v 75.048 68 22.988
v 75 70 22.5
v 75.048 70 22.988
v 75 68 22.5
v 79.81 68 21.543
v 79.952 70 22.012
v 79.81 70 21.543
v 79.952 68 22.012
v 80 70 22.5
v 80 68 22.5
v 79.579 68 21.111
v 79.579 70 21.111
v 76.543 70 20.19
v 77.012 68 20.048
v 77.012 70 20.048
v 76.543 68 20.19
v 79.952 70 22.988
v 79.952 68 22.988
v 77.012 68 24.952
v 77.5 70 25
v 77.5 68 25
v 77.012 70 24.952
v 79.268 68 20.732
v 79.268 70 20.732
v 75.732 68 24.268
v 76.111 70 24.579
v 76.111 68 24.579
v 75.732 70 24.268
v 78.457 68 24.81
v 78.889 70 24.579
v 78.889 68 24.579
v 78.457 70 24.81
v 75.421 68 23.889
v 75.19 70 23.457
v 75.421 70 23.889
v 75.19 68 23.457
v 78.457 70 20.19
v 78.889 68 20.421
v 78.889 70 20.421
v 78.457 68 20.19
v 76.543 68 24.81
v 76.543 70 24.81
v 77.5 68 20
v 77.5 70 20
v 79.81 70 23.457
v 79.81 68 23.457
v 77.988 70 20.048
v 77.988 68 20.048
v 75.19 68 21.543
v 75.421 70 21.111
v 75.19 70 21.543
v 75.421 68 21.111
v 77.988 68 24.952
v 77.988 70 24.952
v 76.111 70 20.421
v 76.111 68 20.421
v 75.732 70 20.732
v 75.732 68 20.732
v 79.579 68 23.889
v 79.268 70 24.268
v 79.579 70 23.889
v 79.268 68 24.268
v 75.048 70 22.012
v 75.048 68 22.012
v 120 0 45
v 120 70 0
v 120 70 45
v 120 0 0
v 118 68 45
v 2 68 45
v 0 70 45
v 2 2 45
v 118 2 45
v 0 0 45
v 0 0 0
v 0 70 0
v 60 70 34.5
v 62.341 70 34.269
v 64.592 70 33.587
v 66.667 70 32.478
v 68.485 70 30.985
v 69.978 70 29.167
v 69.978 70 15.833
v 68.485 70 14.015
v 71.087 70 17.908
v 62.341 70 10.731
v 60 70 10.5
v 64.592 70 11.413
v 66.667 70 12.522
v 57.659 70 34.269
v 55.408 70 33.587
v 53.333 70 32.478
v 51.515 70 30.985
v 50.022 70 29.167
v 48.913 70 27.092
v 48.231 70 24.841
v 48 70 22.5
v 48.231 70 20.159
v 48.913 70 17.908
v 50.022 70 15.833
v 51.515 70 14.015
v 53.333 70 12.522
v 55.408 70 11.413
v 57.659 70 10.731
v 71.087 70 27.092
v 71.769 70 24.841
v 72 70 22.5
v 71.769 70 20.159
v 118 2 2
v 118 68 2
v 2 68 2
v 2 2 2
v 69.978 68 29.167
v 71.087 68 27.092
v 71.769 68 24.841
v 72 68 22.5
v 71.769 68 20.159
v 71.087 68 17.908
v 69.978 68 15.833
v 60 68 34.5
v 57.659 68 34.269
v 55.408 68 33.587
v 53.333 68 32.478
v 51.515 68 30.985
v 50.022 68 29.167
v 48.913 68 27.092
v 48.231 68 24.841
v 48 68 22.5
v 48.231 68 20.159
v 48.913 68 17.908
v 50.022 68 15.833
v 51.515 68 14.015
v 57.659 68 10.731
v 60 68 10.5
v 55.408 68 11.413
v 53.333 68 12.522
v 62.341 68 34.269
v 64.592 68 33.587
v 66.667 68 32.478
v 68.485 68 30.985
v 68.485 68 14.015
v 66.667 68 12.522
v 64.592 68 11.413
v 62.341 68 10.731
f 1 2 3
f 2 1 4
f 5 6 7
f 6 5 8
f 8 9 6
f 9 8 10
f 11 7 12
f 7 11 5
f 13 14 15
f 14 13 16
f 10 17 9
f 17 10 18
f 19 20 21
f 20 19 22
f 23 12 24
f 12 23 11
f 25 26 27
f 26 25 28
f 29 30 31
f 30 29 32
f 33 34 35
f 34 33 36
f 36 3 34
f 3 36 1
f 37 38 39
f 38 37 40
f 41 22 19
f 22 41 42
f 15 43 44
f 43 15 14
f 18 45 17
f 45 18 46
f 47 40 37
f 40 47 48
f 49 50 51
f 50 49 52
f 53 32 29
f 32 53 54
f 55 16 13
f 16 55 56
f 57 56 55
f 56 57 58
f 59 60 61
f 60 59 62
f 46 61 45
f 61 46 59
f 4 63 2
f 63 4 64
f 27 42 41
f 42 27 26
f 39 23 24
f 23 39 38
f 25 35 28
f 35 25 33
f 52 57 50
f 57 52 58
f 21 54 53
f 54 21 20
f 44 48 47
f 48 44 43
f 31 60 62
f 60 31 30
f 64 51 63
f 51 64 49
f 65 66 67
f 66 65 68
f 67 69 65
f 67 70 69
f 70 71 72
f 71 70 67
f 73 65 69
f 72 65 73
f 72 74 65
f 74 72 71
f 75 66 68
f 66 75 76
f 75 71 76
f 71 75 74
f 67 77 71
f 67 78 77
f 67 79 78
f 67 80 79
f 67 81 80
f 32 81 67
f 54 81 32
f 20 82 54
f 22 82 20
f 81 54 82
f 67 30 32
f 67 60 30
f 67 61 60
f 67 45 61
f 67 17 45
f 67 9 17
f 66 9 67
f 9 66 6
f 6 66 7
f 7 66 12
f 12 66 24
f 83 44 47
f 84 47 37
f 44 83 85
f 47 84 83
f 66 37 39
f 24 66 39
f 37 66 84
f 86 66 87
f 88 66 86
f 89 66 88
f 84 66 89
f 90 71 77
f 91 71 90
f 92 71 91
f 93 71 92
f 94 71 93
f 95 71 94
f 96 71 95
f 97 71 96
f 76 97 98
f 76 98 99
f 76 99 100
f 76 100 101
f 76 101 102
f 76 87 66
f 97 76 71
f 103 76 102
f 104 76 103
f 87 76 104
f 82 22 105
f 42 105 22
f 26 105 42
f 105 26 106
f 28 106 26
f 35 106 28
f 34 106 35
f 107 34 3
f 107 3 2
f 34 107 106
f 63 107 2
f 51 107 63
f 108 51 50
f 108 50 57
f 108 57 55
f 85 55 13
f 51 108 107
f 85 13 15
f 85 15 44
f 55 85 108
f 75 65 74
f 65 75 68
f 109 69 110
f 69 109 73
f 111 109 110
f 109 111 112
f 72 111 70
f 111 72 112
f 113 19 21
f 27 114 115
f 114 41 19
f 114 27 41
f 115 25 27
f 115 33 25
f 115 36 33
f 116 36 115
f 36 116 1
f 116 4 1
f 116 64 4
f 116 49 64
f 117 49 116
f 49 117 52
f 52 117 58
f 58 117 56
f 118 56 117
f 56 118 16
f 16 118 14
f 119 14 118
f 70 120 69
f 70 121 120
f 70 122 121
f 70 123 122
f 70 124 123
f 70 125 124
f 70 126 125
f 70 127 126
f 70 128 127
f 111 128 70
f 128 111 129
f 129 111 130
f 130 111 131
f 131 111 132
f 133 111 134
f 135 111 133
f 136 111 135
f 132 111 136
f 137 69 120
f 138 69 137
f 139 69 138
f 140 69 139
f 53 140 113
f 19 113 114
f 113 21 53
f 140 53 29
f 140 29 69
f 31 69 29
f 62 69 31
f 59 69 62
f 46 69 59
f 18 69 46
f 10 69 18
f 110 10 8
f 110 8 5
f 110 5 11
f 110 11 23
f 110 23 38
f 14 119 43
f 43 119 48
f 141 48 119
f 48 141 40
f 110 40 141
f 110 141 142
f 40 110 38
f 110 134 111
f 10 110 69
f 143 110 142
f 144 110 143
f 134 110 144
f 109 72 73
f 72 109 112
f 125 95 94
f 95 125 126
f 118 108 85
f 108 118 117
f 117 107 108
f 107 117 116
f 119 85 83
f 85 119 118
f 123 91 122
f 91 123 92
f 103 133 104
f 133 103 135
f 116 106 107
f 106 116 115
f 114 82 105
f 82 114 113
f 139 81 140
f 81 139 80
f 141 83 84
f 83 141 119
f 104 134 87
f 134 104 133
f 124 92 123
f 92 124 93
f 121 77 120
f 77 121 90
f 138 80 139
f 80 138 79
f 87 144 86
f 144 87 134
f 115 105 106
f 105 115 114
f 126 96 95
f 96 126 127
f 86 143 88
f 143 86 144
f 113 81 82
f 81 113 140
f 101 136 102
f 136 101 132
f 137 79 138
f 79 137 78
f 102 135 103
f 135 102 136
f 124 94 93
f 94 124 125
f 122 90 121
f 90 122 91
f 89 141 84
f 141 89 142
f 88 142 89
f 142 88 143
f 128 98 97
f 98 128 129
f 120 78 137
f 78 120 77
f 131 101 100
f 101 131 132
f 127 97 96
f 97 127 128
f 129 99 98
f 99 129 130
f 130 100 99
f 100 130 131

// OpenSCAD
$fn = 32;

// ----------------------------------------------------------------------
// Vent box: roundvent enclosure
// ----------------------------------------------------------------------

// --- parameters (mm) ---
box_l = 120;              // box length, X
box_w = 70;               // box width, Y
box_h = 45;               // box height, Z
wall_t = 2;               // shell wall thickness
vent_d = 24;              // central vent diameter
ring_d = 5;               // ring hole diameter
n_ring = 8;               // holes in the ring
ring_r = 17.5;            // ring radius

ring_step = 360 / n_ring;  // ring hole angular step

difference() {
  cube([box_l, box_w, box_h]);
  translate([wall_t, wall_t, wall_t])
    cube([box_l - 2 * wall_t, box_w - 2 * wall_t, box_h]);
  translate([box_l / 2, box_w - wall_t - 1, box_h / 2])
    rotate([-90, 0, 0]) cylinder(h = wall_t + 2, d = vent_d);
  for (i = [0 : n_ring - 1])
    translate([box_l / 2, box_w - wall_t - 1, box_h / 2])
      rotate([0, 0, i * ring_step])
        translate([ring_r, 0, 0]) rotate([-90, 0, 0])
          cylinder(h = wall_t + 2, d = ring_d);
}
